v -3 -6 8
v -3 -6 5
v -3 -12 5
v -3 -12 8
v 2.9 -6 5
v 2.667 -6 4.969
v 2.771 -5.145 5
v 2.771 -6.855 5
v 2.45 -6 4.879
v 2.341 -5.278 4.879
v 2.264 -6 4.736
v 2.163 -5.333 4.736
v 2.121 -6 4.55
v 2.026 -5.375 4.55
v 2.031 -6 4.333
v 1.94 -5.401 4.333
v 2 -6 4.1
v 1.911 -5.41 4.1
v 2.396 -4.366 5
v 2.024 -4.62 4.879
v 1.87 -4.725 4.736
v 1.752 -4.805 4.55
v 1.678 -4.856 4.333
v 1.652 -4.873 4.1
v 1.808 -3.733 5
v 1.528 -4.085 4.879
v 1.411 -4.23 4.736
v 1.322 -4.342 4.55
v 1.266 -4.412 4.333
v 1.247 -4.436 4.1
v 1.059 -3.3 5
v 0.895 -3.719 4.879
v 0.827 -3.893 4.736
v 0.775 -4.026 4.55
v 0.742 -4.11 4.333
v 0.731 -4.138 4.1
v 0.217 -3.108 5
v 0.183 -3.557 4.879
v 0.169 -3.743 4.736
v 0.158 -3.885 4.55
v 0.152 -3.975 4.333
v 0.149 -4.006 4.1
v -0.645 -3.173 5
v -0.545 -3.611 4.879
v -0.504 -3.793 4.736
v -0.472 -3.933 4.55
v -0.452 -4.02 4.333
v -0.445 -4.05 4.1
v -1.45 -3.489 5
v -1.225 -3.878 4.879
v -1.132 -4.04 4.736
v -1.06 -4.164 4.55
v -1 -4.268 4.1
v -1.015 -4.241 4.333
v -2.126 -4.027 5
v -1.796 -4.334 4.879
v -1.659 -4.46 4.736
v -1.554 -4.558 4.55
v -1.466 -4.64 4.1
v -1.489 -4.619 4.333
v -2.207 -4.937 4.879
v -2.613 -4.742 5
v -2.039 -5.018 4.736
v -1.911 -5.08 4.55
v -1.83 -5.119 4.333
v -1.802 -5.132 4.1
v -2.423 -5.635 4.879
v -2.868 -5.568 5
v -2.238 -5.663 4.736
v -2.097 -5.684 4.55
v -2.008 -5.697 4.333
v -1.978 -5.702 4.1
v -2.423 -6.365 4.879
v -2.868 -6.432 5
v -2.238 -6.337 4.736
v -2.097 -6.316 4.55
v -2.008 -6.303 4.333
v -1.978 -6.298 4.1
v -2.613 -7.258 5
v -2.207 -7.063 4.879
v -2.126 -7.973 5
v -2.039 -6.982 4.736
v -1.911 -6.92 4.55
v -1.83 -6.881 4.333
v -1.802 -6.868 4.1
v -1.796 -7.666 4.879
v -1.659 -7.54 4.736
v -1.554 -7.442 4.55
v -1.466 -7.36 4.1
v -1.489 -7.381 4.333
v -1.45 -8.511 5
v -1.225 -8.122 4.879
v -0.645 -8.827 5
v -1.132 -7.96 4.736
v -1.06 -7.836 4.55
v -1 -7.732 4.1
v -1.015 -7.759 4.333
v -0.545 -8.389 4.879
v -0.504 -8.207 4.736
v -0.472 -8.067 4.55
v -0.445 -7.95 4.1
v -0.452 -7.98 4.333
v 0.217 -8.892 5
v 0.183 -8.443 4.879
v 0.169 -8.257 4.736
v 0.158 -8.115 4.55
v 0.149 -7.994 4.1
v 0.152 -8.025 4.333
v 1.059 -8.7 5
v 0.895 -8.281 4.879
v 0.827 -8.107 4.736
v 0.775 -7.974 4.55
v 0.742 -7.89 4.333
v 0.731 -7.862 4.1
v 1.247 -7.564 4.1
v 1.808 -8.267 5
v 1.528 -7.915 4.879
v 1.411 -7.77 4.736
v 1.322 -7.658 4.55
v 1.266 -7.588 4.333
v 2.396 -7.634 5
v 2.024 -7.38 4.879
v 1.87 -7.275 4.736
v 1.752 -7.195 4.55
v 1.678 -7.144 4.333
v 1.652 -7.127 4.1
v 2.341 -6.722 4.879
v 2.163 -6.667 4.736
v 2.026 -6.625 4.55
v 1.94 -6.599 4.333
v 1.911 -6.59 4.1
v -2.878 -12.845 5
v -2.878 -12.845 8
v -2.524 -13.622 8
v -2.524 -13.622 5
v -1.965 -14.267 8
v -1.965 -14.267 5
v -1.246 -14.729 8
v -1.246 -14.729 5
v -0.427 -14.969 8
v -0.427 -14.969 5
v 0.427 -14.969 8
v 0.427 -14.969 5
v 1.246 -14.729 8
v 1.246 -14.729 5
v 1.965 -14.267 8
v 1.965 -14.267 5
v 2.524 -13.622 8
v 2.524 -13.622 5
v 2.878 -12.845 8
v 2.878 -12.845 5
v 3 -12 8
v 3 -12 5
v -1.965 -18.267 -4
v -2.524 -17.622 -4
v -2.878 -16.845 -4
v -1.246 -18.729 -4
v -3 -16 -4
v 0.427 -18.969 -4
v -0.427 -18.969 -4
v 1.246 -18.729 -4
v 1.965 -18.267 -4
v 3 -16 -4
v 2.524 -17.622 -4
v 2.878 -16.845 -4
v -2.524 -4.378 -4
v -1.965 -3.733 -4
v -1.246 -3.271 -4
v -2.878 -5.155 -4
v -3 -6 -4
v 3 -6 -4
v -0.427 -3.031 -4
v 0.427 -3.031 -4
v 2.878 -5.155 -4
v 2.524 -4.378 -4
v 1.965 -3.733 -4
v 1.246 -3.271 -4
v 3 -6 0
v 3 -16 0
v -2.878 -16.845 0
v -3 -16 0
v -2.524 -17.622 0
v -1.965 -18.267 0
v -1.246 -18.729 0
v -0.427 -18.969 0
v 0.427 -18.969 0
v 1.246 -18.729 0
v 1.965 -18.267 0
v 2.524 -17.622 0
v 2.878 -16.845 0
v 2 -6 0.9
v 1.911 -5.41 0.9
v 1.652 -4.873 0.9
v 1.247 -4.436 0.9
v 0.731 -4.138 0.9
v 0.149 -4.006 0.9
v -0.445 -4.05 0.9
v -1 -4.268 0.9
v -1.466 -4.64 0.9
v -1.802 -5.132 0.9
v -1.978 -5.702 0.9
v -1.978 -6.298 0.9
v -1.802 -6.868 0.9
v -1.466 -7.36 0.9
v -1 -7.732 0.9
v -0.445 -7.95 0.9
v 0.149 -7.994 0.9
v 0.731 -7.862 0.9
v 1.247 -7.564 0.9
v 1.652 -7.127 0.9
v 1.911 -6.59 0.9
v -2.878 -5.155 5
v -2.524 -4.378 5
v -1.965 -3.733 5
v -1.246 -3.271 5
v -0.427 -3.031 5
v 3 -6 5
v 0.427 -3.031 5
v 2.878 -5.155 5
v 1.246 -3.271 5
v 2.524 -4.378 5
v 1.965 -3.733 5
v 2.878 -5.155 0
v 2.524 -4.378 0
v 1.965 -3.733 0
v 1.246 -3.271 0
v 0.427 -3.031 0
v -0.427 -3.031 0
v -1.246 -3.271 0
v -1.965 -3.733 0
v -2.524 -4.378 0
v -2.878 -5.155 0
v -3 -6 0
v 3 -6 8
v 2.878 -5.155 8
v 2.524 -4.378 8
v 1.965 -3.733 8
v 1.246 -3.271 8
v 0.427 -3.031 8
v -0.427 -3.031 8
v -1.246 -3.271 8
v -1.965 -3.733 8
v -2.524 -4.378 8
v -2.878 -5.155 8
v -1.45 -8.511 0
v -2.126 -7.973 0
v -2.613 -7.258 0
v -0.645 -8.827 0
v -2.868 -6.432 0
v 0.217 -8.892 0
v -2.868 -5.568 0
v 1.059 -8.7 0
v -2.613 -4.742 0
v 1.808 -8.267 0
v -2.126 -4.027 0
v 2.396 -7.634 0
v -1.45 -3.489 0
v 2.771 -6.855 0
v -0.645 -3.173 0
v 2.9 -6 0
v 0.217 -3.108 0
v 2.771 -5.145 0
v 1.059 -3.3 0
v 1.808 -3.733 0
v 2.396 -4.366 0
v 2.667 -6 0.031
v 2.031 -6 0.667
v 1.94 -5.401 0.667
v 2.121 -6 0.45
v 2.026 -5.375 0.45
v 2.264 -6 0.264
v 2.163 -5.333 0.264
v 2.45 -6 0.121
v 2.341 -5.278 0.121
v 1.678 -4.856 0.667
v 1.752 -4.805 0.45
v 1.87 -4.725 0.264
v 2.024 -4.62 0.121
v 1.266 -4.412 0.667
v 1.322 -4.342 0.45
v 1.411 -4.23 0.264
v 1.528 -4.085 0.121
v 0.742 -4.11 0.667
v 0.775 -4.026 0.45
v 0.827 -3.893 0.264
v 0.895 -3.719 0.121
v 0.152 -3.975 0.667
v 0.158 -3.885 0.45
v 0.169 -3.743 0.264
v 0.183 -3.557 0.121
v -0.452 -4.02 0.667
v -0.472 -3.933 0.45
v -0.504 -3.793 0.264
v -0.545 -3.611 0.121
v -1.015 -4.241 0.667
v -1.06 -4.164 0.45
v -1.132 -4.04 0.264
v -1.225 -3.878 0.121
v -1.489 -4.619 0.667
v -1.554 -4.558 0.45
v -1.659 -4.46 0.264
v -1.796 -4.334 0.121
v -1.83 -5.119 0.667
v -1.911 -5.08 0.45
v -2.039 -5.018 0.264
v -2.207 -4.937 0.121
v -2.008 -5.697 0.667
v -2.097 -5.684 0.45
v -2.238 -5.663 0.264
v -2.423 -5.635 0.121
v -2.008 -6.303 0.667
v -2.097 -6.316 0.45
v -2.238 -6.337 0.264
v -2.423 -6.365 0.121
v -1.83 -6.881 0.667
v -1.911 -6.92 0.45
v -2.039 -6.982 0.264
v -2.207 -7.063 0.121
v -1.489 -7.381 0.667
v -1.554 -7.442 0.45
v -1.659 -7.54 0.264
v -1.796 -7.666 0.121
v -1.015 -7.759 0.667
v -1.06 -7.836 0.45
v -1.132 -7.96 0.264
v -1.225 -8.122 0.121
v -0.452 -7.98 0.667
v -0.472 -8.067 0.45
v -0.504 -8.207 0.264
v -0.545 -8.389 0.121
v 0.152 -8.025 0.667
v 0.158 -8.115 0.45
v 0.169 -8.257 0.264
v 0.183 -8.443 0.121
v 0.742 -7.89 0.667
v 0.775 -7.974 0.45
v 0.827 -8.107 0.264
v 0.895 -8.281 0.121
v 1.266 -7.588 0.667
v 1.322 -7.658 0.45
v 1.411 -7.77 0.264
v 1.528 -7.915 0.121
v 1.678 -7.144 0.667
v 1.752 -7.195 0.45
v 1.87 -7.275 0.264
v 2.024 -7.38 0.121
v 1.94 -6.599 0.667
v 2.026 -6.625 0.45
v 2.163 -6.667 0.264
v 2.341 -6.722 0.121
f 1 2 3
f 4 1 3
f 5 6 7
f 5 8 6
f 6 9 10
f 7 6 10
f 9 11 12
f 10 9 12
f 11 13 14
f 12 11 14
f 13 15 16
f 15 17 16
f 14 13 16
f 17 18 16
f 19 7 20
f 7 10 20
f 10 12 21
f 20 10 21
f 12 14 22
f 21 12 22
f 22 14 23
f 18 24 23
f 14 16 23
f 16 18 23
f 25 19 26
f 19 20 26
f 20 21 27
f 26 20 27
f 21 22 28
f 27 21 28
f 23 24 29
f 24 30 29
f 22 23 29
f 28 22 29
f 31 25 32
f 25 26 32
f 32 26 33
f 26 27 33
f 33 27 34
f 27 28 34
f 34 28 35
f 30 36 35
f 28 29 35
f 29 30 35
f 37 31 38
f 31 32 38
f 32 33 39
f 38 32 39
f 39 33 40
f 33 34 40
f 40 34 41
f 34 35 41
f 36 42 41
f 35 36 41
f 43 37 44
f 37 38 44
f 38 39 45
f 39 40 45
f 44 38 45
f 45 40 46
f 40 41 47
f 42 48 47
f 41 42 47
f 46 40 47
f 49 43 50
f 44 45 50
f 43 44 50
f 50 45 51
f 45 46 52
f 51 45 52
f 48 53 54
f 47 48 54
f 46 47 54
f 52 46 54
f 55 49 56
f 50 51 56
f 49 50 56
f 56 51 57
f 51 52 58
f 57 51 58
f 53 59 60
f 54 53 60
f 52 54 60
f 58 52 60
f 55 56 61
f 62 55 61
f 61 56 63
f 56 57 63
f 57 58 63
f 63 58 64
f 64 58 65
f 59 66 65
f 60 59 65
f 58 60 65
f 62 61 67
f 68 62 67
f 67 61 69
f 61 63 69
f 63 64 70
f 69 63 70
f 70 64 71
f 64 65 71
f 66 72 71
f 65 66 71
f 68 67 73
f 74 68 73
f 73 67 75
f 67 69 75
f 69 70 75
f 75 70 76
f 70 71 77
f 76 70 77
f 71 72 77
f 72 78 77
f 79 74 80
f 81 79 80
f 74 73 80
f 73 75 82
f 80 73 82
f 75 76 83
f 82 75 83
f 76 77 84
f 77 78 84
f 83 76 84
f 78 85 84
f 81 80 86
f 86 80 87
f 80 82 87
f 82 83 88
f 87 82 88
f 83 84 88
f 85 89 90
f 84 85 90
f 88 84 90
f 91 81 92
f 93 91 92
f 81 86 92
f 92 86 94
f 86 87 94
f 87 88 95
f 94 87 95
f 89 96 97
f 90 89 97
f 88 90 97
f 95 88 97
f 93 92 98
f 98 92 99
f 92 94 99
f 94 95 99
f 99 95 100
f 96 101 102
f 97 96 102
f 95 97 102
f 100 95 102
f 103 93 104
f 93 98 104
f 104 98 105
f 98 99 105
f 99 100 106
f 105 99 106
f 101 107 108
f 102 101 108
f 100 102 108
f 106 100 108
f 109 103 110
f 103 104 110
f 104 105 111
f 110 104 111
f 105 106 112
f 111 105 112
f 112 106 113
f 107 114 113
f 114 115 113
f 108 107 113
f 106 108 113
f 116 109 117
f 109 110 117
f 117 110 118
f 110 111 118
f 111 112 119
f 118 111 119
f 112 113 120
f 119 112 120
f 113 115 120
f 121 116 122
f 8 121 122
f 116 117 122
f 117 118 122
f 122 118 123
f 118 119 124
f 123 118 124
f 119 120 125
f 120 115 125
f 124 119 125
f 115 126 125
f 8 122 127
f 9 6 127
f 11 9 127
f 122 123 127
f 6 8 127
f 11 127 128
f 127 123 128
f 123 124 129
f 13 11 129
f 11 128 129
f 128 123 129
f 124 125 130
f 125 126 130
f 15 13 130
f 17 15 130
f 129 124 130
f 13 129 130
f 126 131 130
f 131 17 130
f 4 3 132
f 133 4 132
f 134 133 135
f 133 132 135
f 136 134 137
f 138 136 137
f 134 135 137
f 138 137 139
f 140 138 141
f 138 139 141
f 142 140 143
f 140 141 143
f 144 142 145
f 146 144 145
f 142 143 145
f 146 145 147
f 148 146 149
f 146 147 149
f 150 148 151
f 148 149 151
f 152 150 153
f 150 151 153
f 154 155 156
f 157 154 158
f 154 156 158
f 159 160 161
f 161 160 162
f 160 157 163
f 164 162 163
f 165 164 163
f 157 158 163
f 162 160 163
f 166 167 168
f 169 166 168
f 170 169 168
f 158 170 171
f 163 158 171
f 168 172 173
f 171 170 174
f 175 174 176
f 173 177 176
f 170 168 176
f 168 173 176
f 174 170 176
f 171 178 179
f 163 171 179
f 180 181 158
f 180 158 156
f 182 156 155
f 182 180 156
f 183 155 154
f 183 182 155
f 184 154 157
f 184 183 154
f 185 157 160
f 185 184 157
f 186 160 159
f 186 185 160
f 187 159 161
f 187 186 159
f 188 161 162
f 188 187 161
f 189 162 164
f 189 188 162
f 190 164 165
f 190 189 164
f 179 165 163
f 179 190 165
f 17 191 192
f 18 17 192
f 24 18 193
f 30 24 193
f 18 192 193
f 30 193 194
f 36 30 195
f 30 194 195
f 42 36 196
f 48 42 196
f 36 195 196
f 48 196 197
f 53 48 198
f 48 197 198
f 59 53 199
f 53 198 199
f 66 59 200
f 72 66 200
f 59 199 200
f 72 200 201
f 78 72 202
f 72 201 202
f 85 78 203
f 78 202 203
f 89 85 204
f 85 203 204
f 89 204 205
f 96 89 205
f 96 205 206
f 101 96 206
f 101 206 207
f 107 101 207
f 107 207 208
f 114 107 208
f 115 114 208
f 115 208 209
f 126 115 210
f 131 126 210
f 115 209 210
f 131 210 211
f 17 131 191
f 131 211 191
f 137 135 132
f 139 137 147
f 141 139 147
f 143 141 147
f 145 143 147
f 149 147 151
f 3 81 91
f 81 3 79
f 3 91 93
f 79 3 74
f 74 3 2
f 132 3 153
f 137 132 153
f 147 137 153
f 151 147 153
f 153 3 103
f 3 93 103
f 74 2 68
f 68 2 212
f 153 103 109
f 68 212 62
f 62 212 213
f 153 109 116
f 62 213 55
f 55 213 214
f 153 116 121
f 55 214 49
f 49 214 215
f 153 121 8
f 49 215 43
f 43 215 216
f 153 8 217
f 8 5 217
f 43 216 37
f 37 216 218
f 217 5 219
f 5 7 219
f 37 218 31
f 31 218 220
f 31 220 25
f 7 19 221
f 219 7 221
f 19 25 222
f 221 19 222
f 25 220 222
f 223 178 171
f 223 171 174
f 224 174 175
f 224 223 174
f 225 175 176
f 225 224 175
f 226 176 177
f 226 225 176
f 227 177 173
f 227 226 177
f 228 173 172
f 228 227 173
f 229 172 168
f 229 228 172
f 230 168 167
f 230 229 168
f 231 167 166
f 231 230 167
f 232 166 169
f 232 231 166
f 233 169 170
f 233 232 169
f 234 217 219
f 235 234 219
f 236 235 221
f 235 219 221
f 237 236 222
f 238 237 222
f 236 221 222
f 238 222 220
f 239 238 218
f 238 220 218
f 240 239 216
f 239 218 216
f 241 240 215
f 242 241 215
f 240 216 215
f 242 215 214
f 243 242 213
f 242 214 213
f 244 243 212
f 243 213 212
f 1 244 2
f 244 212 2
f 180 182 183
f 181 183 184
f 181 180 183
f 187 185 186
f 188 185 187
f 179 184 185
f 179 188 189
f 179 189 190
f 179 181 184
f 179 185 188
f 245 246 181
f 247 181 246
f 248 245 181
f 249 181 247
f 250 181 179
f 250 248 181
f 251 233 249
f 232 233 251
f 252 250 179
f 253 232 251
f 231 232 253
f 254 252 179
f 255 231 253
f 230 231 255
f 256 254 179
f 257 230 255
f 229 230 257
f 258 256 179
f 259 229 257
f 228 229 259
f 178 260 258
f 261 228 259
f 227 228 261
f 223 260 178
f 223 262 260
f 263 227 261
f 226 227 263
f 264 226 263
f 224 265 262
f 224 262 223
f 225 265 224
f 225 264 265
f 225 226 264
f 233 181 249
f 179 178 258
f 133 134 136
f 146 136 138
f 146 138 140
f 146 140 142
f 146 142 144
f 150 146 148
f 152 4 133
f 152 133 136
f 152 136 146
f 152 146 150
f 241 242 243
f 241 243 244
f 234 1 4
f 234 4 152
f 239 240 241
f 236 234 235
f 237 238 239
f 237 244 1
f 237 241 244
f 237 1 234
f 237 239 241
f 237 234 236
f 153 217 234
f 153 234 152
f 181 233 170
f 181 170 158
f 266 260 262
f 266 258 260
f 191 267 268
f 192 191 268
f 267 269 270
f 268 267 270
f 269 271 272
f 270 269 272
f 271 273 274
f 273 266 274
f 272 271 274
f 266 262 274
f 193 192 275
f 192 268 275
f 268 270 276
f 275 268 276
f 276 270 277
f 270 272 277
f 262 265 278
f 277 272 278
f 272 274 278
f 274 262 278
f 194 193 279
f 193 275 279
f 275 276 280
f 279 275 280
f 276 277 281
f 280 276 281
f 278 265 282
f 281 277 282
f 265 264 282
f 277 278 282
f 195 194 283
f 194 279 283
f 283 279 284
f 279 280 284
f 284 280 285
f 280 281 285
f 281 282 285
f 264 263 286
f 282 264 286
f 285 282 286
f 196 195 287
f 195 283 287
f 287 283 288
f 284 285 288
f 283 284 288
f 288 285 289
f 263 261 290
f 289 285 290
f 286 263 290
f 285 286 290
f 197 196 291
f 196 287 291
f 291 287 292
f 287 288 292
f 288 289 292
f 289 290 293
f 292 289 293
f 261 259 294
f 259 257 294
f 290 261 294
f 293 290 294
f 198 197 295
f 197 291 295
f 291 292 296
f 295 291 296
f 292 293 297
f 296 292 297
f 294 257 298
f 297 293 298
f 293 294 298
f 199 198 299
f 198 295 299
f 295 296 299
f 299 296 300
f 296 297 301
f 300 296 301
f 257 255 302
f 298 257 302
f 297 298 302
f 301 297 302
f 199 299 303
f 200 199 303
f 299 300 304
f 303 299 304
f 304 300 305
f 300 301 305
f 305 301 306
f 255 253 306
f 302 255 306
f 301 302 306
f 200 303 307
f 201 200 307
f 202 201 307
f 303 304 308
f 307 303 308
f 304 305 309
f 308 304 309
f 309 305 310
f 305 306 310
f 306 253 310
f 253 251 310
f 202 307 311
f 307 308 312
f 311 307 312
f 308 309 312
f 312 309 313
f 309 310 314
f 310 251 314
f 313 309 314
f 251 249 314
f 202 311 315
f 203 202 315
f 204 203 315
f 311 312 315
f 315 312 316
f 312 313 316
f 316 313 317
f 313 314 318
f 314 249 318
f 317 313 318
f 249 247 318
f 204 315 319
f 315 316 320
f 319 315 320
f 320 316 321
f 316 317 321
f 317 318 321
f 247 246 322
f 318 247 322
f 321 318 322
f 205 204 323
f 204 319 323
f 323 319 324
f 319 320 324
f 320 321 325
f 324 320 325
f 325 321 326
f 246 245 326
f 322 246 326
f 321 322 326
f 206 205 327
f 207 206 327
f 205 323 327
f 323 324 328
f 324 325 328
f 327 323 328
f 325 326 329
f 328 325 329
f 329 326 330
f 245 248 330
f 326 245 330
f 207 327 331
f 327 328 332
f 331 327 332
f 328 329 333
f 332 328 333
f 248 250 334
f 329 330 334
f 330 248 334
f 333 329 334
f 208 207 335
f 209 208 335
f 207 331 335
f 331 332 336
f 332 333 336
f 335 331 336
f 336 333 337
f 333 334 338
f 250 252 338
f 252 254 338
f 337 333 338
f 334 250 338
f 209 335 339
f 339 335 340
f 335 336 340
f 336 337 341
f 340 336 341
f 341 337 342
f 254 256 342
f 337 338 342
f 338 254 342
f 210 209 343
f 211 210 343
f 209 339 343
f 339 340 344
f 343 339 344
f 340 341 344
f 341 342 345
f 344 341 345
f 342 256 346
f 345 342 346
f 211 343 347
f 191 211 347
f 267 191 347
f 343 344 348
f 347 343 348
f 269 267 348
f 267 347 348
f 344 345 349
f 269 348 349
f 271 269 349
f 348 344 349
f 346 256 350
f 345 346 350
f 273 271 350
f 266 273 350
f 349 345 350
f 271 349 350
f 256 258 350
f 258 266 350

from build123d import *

# Parameters (mm, degrees)
PAD004_DEPTH = 4
SKETCH005_R  = 2
PAD005_DEPTH = 5
PAD006_DEPTH = 3
FILLET003_R  = 0.9
FILLET004_R  = 0.9


with BuildPart() as part:
    # Sketch004 → Pad004 (new body)
    with BuildSketch(Plane.XY):
        with BuildLine():
            ThreePointArc((3, -6), (0, -3), (-3, -6))
            Line((-3, -6), (-3, -16))
            ThreePointArc((-3, -16), (0, -19), (3, -16))
            Line((3, -6), (3, -16))
        make_face()
    extrude(amount=-PAD004_DEPTH)

    # Sketch005 → Pad005 (new body)
    with BuildSketch(Plane.XY):
        with Locations((0, -6)):
            Circle(SKETCH005_R)
    extrude(amount=PAD005_DEPTH)

    # Sketch006 → Pad006 (new body)
    with BuildSketch(Plane.XY.offset(5)):
        with BuildLine():
            ThreePointArc((3, -6), (0, -3), (-3, -6))
            Line((-3, -6), (-3, -12))
            ThreePointArc((-3, -12), (0, -15), (3, -12))
            Line((3, -6), (3, -12))
        make_face()
    extrude(amount=PAD006_DEPTH)

    # Fillet003
    fillet003_edges = [part.edges().sort_by_distance(p)[0] for p in [
        (-2, -6, 5),
    ]]
    fillet(fillet003_edges, radius=FILLET003_R)

    # Fillet004
    fillet004_edges = [part.edges().sort_by_distance(p)[0] for p in [
        (-2, -6, 0),
    ]]
    fillet(fillet004_edges, radius=FILLET004_R)


solid = part.part
